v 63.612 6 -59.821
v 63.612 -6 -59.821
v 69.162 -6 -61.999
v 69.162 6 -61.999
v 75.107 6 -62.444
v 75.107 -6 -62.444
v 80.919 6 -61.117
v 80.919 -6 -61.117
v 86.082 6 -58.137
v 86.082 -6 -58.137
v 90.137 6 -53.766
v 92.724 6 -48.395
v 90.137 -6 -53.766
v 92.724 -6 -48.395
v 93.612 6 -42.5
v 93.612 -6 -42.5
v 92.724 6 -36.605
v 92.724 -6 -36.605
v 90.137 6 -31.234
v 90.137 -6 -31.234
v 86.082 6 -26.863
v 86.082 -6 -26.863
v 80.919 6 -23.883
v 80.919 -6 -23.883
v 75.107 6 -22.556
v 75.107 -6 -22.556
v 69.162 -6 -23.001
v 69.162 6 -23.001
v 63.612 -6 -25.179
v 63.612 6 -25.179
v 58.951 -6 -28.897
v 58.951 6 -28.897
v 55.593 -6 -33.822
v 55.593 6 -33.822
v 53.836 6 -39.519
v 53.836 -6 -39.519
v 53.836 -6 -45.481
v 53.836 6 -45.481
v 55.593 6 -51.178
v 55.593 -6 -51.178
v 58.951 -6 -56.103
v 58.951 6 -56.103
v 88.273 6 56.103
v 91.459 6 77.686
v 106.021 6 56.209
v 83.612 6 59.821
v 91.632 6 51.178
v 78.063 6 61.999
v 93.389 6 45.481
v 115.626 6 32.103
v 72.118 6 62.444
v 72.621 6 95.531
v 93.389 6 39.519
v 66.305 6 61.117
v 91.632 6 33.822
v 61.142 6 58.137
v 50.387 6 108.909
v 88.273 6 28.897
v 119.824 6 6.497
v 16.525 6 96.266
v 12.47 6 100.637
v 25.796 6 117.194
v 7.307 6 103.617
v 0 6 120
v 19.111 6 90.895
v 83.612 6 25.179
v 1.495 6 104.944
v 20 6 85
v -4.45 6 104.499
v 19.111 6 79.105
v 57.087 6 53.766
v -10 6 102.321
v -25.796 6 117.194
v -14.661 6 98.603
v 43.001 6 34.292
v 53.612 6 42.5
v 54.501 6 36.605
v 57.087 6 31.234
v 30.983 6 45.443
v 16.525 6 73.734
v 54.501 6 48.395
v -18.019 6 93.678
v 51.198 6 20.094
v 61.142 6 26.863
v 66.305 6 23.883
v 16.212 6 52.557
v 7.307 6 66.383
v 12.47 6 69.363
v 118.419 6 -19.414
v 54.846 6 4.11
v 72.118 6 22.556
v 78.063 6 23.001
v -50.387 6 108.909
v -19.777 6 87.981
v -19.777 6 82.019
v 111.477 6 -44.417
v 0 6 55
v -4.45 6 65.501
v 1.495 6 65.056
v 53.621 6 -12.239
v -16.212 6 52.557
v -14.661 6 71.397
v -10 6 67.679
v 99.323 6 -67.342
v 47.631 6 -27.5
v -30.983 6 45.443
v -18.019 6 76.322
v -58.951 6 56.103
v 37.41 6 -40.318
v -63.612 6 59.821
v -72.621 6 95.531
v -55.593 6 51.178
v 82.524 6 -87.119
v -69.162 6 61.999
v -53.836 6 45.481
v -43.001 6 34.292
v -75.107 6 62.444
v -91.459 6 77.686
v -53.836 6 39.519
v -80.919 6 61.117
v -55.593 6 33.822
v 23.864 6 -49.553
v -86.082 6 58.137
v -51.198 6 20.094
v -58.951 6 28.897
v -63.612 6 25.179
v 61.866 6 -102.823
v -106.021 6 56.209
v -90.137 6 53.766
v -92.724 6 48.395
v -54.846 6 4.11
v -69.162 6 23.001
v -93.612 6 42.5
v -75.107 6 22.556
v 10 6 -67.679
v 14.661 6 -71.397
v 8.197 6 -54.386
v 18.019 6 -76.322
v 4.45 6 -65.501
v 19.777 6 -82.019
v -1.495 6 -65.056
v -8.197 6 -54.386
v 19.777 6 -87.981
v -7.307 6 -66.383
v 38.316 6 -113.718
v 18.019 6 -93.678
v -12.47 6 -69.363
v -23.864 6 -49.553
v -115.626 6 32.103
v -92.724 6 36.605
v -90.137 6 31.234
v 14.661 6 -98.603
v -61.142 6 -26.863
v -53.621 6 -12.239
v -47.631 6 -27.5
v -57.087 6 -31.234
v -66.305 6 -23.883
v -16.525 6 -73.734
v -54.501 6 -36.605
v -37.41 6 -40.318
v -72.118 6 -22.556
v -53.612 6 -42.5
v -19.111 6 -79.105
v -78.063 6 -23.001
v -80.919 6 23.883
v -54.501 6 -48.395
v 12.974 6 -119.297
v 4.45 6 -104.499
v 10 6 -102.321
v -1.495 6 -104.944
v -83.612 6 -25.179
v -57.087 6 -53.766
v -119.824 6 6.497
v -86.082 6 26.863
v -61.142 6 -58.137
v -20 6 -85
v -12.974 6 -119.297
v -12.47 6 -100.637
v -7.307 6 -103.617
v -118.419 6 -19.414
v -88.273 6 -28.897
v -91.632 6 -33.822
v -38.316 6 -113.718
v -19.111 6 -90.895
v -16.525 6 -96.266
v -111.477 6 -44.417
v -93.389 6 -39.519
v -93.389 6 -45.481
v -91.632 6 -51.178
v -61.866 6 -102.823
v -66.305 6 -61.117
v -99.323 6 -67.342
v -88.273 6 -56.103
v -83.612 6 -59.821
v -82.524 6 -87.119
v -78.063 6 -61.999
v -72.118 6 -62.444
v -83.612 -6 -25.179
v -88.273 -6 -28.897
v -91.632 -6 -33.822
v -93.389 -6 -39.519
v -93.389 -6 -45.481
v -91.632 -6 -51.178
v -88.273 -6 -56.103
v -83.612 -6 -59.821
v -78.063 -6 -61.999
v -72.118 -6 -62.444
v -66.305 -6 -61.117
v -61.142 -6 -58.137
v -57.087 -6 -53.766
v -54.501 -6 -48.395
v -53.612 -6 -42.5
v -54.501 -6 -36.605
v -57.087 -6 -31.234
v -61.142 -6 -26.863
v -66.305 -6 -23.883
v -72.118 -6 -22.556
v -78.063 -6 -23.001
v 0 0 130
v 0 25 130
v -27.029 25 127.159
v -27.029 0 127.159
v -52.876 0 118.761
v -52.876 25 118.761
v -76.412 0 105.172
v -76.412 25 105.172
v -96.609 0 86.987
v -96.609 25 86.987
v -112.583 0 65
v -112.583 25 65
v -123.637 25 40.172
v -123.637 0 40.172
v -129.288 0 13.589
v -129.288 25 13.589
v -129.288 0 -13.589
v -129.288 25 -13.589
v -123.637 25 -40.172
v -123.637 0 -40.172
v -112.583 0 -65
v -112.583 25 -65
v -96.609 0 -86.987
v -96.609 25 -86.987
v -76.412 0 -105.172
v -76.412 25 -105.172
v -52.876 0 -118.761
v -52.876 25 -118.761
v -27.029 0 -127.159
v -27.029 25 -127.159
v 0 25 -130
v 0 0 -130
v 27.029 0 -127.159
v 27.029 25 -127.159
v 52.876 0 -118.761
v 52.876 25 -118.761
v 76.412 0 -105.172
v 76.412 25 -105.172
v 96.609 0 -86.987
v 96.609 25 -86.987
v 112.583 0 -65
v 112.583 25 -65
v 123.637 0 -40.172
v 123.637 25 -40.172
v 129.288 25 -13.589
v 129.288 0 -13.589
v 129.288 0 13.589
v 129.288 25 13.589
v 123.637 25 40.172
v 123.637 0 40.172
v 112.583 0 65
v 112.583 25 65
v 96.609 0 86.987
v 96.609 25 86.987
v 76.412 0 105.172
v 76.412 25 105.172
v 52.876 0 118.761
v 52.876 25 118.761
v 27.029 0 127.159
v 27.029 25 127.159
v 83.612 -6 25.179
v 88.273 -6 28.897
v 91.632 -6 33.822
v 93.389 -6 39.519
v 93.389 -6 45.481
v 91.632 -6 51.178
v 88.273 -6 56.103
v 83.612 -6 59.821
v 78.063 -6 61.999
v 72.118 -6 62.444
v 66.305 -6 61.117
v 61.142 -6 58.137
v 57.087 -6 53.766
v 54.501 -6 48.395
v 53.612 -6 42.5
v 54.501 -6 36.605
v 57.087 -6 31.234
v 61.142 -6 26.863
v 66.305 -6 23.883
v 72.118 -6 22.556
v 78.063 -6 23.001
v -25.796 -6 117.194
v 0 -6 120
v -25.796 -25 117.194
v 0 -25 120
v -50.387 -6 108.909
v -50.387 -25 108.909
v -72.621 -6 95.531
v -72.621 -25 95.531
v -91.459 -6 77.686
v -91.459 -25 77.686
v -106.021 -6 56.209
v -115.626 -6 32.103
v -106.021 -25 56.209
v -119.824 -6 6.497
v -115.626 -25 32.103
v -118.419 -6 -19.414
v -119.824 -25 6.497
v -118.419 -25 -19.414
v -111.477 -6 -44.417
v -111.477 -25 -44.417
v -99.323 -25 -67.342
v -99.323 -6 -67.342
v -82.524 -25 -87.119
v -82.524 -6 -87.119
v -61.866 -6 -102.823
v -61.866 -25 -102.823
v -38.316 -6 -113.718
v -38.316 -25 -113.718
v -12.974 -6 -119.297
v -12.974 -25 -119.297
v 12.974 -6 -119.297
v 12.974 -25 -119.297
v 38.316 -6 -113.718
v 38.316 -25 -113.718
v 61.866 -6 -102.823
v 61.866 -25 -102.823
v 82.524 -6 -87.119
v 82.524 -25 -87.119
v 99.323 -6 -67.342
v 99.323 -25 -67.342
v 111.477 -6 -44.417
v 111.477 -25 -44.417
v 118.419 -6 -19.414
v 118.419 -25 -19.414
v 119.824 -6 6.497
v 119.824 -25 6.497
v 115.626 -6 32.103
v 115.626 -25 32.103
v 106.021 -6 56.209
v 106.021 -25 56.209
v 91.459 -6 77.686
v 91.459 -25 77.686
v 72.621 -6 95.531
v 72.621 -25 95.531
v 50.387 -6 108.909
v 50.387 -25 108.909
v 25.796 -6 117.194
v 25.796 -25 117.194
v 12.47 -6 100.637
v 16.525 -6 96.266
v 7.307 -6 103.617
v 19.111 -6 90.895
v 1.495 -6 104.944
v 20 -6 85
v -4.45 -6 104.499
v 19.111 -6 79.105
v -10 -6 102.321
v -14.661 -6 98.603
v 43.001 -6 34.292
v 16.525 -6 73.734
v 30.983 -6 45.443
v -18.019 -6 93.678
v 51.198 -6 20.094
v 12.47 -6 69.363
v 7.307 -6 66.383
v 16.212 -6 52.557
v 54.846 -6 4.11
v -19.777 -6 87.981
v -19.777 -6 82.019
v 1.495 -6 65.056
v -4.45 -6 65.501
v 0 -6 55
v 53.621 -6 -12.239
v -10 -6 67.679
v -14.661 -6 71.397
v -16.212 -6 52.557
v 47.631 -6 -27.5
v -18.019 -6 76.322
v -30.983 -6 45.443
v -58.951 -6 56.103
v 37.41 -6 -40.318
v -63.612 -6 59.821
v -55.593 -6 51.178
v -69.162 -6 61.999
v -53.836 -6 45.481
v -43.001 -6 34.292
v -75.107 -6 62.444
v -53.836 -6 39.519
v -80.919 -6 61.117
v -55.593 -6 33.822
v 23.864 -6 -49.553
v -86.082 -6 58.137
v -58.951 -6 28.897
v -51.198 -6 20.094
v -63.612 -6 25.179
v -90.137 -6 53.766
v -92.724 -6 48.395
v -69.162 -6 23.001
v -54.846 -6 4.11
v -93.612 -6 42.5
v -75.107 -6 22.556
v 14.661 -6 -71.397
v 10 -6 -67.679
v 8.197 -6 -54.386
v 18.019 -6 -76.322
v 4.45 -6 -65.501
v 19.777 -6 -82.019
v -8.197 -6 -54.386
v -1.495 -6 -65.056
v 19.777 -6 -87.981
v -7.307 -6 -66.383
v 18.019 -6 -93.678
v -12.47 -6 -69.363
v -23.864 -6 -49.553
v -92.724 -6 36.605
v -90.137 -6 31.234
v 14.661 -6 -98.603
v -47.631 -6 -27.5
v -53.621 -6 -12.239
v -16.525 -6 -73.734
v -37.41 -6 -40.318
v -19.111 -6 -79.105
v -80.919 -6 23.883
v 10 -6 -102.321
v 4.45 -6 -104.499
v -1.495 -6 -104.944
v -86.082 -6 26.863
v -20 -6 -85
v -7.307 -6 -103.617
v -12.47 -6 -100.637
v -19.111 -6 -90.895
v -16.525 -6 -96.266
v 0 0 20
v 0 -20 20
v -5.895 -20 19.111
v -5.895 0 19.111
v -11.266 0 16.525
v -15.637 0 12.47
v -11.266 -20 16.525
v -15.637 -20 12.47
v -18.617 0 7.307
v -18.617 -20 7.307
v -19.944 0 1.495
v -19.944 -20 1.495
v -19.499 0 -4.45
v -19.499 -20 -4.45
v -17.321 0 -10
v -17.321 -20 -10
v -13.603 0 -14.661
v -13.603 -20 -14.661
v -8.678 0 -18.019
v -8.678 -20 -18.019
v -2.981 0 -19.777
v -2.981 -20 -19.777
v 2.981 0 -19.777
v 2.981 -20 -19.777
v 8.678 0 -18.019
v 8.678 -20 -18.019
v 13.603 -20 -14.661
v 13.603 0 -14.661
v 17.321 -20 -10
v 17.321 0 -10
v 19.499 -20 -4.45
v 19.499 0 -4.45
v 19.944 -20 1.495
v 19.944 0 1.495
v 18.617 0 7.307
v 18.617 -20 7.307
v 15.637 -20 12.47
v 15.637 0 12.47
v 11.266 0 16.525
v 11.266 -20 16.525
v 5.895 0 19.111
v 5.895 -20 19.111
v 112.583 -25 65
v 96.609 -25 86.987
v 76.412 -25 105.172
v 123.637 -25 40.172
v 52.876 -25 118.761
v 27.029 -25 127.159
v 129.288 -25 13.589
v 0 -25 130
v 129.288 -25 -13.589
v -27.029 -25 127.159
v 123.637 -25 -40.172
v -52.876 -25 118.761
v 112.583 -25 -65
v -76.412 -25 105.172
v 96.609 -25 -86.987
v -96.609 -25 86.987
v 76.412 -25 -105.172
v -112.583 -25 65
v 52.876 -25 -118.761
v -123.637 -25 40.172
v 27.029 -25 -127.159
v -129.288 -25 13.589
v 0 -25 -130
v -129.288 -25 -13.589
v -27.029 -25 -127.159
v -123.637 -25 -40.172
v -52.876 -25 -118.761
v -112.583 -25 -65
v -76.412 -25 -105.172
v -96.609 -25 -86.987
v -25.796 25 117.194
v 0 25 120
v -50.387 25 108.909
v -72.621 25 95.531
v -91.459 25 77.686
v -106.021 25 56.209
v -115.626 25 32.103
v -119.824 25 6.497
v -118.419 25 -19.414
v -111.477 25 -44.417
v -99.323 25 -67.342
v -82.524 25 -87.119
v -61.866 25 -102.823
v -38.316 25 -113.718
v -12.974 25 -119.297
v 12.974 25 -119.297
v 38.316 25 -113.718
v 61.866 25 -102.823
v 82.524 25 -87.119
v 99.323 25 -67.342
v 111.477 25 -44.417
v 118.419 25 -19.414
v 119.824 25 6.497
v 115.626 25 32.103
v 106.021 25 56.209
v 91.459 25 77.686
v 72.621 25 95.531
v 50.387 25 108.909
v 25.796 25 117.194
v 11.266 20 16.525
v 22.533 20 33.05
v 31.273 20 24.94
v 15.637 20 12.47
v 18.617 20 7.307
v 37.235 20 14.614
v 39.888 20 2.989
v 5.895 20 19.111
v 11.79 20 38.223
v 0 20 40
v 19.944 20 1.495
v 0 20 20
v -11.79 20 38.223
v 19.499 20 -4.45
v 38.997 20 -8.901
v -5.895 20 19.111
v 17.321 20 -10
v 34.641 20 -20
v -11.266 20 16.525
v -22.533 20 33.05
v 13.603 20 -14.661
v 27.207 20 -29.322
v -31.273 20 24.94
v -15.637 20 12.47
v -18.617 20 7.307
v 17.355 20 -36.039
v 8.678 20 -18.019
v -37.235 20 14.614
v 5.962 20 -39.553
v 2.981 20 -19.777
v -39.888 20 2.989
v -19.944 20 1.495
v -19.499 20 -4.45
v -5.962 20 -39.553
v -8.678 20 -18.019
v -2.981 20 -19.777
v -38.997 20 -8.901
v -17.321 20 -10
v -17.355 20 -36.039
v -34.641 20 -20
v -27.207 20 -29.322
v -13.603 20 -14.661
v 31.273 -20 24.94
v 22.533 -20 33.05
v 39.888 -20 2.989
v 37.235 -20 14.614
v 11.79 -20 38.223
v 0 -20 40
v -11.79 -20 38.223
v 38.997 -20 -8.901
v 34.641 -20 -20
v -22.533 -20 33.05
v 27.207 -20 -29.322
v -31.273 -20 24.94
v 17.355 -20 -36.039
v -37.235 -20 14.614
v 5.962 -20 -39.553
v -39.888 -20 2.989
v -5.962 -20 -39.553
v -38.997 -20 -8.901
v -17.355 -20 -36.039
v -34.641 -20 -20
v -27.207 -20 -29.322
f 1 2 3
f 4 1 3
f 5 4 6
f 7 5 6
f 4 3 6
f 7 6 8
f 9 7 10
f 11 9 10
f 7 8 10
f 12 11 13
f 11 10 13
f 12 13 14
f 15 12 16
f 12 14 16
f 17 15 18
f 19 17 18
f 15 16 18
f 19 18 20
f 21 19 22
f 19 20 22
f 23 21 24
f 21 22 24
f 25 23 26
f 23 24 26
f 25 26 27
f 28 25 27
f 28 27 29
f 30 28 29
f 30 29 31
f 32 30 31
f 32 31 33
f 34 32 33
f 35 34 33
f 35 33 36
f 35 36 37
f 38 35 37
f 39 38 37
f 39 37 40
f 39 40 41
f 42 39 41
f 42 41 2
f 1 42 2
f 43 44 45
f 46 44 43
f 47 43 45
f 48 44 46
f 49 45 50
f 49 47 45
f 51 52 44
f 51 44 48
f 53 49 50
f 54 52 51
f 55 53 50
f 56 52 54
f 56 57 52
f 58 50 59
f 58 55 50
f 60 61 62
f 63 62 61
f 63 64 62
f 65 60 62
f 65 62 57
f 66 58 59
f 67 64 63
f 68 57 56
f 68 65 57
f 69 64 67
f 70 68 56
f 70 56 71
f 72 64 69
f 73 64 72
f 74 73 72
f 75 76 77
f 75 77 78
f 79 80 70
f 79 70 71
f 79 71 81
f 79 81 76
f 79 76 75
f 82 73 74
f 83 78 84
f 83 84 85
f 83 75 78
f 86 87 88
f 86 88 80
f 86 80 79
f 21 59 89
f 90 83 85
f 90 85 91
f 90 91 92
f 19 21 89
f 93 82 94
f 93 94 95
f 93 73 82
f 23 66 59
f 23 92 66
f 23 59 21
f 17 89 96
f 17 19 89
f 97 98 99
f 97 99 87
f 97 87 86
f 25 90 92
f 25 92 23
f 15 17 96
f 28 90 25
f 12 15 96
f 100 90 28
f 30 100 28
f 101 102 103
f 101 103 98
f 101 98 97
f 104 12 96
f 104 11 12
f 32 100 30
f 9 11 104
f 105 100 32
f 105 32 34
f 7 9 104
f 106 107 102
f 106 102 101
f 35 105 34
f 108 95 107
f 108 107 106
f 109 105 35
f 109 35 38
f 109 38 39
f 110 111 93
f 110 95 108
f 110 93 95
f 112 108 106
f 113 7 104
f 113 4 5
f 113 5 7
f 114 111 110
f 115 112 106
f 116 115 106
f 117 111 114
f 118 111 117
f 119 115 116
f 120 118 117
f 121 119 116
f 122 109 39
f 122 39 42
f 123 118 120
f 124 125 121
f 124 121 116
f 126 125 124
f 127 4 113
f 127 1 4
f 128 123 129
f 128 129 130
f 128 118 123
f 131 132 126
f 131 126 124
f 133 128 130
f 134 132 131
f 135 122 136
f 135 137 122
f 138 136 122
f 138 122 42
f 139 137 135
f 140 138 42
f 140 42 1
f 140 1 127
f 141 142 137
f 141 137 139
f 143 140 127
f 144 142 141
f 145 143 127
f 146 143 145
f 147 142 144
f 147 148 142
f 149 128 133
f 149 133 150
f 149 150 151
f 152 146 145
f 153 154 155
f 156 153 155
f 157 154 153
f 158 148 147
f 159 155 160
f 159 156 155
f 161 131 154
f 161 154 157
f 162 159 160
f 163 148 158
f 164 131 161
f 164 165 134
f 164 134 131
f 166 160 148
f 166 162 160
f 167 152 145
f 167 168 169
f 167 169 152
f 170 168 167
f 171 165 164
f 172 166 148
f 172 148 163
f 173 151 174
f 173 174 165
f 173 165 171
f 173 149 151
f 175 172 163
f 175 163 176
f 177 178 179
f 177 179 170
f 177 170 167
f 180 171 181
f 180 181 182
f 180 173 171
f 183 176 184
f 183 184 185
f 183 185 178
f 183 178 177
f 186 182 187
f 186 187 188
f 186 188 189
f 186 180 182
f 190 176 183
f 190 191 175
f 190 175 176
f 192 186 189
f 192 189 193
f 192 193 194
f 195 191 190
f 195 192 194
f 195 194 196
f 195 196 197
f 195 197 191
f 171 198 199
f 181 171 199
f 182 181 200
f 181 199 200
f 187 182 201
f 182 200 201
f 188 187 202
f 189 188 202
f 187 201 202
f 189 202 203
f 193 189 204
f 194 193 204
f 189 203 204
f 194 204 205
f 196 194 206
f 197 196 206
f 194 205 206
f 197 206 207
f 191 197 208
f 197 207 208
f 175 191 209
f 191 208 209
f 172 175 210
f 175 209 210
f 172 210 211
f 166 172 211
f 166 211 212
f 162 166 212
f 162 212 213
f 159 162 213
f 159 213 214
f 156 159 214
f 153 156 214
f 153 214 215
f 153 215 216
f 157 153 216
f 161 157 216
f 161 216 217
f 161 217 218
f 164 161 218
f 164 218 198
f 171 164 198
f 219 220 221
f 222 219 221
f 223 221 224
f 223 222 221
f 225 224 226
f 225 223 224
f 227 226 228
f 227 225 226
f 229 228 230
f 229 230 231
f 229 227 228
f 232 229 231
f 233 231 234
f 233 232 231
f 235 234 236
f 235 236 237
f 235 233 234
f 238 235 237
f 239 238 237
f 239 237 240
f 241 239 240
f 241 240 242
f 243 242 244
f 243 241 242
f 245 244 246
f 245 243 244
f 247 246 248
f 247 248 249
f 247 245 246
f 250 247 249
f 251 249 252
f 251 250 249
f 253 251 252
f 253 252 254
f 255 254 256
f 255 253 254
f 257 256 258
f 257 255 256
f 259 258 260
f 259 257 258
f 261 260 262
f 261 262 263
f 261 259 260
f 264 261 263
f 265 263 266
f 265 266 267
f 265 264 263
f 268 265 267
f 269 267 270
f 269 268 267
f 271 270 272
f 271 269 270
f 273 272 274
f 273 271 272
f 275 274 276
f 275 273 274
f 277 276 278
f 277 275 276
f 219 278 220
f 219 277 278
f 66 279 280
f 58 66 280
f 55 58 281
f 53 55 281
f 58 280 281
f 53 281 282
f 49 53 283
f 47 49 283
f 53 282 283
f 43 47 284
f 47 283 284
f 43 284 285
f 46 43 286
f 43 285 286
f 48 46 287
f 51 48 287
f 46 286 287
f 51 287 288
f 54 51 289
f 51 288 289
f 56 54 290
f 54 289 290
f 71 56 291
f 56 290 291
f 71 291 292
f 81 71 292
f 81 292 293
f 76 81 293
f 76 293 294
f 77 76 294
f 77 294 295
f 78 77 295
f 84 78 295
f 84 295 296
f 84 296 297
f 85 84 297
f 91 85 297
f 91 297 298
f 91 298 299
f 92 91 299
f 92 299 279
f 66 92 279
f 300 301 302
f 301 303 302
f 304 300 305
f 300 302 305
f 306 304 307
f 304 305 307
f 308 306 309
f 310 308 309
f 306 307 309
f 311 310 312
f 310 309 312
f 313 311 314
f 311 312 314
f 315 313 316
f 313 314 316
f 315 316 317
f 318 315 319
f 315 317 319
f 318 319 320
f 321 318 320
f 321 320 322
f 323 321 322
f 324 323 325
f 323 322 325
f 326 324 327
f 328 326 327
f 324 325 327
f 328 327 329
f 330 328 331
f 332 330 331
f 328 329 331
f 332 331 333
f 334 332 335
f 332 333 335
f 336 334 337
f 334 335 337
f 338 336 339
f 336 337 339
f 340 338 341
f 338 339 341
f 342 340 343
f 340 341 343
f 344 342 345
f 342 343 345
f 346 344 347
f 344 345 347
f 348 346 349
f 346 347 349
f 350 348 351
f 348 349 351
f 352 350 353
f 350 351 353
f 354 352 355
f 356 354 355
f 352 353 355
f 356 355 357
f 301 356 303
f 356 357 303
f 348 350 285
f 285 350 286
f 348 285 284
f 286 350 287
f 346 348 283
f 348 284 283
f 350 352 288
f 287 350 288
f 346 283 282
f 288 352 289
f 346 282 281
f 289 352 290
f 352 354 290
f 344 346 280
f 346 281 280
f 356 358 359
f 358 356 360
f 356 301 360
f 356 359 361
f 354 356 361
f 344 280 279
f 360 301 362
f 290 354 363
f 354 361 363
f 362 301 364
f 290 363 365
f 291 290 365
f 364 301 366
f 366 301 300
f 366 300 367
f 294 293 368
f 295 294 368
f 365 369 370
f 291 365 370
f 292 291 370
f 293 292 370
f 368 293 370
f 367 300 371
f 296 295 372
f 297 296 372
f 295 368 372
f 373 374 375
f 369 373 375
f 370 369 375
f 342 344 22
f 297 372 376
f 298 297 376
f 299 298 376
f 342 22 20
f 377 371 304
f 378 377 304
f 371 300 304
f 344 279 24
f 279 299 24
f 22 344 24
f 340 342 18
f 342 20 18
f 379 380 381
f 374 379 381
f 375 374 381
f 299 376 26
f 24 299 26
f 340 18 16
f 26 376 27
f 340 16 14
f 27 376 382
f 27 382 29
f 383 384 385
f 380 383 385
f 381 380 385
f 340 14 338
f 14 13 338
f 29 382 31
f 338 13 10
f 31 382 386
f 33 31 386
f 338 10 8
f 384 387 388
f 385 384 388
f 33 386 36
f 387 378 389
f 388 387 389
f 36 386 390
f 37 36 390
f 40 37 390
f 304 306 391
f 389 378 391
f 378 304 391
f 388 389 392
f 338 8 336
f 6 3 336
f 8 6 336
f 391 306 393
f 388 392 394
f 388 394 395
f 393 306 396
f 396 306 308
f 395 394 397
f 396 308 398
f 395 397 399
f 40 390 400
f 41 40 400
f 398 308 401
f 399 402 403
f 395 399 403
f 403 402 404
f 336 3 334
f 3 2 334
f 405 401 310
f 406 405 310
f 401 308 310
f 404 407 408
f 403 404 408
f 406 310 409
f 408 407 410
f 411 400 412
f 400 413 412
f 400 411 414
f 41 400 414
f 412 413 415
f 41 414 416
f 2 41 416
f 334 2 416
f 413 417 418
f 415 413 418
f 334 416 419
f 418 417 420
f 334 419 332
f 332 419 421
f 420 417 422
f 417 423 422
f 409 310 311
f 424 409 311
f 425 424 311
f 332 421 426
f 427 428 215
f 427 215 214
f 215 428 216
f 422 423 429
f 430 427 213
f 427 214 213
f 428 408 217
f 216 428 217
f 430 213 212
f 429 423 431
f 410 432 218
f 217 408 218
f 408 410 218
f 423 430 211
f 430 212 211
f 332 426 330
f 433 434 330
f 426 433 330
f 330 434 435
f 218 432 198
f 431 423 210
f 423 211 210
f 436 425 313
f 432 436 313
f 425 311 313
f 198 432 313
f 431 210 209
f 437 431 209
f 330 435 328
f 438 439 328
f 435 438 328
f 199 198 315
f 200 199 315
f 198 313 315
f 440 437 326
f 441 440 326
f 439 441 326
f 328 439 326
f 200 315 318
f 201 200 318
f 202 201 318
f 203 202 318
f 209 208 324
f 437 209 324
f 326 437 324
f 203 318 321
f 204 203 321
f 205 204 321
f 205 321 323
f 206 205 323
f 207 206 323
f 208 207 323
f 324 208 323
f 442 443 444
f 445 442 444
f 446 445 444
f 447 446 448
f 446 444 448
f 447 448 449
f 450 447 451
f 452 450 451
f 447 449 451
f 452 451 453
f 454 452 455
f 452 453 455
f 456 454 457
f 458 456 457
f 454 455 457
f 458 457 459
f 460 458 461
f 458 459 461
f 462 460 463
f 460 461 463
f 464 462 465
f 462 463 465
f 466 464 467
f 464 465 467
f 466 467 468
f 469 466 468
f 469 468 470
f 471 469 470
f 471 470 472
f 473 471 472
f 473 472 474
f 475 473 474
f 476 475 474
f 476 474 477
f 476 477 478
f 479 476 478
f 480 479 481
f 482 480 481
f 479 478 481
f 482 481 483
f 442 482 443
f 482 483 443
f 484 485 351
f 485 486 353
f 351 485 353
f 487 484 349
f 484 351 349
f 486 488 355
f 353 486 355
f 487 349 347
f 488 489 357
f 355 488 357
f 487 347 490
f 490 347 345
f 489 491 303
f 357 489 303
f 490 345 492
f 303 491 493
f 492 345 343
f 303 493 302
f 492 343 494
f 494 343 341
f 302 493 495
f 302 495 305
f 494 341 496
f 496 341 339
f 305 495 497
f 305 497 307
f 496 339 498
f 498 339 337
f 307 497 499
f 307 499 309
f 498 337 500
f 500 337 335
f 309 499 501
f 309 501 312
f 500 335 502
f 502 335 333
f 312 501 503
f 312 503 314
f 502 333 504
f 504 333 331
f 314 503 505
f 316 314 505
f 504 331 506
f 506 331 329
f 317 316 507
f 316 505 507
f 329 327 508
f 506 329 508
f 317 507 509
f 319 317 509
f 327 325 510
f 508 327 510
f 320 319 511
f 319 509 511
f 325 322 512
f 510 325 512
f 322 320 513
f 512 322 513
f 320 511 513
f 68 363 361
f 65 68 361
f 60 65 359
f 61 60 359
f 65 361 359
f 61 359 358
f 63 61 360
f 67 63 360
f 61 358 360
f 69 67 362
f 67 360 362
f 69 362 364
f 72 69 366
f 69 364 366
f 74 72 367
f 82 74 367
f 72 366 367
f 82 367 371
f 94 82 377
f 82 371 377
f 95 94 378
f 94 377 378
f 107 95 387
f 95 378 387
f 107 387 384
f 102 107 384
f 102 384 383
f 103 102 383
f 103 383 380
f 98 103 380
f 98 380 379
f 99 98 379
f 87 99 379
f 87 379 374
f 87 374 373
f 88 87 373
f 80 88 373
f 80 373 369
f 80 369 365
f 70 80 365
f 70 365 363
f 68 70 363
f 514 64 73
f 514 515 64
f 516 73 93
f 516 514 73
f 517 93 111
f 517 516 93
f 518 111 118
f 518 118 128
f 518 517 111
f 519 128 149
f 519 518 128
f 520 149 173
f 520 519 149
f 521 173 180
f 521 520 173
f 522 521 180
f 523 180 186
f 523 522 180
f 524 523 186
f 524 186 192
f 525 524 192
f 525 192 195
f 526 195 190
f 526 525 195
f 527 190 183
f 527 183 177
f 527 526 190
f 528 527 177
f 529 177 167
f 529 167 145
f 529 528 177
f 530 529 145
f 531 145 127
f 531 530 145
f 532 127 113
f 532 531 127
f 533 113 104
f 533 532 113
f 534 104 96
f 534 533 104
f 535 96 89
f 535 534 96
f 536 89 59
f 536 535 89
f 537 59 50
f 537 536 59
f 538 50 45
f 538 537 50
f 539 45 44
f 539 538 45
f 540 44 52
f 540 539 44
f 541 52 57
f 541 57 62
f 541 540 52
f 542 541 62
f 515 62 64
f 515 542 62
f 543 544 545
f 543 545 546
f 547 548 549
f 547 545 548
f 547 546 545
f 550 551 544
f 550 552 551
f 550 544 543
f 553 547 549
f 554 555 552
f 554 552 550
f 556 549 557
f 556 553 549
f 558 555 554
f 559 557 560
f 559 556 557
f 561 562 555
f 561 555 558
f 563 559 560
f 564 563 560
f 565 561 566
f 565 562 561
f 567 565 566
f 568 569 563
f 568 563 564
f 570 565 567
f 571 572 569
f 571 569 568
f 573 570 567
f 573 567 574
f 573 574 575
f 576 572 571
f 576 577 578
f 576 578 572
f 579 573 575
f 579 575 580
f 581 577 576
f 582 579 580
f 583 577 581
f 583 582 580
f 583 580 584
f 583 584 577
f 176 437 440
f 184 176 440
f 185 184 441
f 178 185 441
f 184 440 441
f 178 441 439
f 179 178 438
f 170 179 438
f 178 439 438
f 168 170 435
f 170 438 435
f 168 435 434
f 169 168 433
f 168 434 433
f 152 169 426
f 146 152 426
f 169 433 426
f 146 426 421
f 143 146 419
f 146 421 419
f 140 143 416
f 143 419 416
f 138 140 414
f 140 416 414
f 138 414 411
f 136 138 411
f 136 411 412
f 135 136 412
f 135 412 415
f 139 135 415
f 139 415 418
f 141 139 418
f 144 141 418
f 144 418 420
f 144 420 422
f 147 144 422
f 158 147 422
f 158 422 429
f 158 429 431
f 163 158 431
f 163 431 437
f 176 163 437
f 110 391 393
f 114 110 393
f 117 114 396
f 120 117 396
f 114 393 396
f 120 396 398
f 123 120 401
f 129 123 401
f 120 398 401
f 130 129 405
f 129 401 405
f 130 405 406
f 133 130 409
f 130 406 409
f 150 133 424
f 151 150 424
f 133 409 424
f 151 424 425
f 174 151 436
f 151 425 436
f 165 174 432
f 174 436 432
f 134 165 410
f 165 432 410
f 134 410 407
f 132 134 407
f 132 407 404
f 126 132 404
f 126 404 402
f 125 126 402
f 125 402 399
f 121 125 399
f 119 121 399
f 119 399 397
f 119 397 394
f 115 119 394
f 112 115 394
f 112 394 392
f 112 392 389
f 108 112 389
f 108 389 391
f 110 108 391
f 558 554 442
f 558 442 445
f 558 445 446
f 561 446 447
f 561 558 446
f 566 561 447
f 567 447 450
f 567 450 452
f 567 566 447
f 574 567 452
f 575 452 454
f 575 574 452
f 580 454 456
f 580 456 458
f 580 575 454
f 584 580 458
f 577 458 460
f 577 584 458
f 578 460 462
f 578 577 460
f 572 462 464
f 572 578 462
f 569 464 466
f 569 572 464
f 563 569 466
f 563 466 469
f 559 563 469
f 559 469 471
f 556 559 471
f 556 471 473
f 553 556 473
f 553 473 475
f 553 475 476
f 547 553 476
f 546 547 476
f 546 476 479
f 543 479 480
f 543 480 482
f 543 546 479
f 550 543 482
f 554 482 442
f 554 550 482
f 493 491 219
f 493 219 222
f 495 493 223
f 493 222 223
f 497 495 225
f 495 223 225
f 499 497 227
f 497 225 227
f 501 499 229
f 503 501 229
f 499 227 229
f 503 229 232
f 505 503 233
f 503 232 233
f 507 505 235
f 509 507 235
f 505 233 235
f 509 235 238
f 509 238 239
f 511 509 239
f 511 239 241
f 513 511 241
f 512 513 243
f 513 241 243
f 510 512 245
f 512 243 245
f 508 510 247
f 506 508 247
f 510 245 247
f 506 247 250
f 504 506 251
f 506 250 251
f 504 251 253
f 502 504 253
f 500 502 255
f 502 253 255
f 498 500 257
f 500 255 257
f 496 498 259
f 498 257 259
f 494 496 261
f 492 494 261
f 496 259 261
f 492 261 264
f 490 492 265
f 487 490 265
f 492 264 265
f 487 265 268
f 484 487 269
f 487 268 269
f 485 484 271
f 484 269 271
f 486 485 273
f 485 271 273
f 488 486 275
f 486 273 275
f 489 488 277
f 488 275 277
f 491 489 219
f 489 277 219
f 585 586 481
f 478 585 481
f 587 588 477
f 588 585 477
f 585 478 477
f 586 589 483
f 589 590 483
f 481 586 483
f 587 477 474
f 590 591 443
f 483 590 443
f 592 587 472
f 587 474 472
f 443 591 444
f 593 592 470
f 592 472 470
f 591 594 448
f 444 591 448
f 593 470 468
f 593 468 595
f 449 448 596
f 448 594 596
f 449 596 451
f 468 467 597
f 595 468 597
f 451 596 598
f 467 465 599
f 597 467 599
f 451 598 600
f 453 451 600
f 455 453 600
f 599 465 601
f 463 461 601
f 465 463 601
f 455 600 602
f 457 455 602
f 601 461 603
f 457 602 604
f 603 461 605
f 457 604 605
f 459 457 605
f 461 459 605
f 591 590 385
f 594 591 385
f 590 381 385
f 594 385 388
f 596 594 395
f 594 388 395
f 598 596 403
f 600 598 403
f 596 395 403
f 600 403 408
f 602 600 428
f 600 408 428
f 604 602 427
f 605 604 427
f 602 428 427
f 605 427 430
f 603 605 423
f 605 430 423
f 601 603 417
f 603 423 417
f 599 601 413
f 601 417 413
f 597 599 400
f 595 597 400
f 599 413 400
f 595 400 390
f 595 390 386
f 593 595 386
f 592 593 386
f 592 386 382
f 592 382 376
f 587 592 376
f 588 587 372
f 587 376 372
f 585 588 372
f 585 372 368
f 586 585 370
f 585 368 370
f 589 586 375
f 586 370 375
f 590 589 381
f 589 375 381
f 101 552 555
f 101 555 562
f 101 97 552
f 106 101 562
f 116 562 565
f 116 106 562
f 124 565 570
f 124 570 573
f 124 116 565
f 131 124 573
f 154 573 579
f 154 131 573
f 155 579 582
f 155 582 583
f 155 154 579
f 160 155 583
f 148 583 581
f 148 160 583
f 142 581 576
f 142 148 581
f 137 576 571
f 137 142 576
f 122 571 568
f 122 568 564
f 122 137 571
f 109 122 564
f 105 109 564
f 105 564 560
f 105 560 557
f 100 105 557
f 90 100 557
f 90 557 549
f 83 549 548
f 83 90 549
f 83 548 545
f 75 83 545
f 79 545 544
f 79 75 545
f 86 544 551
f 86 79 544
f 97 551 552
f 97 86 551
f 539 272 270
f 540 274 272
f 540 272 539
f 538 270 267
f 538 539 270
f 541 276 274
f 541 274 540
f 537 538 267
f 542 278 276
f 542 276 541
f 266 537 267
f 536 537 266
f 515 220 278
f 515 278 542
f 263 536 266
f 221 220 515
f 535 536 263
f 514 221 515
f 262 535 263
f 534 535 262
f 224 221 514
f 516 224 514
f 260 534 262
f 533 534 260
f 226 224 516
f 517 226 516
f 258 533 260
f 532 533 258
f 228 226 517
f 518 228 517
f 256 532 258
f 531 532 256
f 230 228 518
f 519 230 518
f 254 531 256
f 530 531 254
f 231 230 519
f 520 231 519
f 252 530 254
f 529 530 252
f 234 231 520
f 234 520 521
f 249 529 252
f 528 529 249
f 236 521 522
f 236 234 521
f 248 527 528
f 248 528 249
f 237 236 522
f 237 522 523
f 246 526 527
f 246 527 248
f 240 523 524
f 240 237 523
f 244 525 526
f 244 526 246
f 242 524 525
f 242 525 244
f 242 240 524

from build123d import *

# Parameters (mm, degrees)
F5_R            = 20
F6_DEPTH        = 25
F6_COPIES_COUNT = 6


# Not quite as in the source:
# - a pattern or mirror of a feature is missing from the dataset's text; its kind, count and spacing are read off the source's solid


with BuildPart() as f3:
    # F0 (on Right) → F3 (revolve)
    with BuildSketch(Plane.YZ):
        Polygon((25, 130), (0, 130), (0, 20), (20, 20), (20, 40), (6, 55), (6, 120), (25, 120), align=None)
    revolve(axis=Axis((0, 0.1935698092, 0), (0, -1, 0)))

    # F4: F3 across plane


with BuildPart() as f3_1:
    add(f3.part)
    add(f3.part.mirror(Plane.XZ))

    # F5 (on face) → F6 (cut)
    with BuildSketch(Plane.XZ.offset(6)):
        with Locations((0, 85)):
            Circle(F5_R)
    f6 = extrude(amount=-F6_DEPTH, mode=Mode.SUBTRACT)

    # F6_copies: F6 ×6 about axis
    f6_copies_axis = Axis((0, 0, 0), (0, 1, 0))
    for i in range(1, F6_COPIES_COUNT):
        add(f6.rotate(f6_copies_axis, i * 360 / F6_COPIES_COUNT), mode=Mode.SUBTRACT)


solid = f3_1.part
